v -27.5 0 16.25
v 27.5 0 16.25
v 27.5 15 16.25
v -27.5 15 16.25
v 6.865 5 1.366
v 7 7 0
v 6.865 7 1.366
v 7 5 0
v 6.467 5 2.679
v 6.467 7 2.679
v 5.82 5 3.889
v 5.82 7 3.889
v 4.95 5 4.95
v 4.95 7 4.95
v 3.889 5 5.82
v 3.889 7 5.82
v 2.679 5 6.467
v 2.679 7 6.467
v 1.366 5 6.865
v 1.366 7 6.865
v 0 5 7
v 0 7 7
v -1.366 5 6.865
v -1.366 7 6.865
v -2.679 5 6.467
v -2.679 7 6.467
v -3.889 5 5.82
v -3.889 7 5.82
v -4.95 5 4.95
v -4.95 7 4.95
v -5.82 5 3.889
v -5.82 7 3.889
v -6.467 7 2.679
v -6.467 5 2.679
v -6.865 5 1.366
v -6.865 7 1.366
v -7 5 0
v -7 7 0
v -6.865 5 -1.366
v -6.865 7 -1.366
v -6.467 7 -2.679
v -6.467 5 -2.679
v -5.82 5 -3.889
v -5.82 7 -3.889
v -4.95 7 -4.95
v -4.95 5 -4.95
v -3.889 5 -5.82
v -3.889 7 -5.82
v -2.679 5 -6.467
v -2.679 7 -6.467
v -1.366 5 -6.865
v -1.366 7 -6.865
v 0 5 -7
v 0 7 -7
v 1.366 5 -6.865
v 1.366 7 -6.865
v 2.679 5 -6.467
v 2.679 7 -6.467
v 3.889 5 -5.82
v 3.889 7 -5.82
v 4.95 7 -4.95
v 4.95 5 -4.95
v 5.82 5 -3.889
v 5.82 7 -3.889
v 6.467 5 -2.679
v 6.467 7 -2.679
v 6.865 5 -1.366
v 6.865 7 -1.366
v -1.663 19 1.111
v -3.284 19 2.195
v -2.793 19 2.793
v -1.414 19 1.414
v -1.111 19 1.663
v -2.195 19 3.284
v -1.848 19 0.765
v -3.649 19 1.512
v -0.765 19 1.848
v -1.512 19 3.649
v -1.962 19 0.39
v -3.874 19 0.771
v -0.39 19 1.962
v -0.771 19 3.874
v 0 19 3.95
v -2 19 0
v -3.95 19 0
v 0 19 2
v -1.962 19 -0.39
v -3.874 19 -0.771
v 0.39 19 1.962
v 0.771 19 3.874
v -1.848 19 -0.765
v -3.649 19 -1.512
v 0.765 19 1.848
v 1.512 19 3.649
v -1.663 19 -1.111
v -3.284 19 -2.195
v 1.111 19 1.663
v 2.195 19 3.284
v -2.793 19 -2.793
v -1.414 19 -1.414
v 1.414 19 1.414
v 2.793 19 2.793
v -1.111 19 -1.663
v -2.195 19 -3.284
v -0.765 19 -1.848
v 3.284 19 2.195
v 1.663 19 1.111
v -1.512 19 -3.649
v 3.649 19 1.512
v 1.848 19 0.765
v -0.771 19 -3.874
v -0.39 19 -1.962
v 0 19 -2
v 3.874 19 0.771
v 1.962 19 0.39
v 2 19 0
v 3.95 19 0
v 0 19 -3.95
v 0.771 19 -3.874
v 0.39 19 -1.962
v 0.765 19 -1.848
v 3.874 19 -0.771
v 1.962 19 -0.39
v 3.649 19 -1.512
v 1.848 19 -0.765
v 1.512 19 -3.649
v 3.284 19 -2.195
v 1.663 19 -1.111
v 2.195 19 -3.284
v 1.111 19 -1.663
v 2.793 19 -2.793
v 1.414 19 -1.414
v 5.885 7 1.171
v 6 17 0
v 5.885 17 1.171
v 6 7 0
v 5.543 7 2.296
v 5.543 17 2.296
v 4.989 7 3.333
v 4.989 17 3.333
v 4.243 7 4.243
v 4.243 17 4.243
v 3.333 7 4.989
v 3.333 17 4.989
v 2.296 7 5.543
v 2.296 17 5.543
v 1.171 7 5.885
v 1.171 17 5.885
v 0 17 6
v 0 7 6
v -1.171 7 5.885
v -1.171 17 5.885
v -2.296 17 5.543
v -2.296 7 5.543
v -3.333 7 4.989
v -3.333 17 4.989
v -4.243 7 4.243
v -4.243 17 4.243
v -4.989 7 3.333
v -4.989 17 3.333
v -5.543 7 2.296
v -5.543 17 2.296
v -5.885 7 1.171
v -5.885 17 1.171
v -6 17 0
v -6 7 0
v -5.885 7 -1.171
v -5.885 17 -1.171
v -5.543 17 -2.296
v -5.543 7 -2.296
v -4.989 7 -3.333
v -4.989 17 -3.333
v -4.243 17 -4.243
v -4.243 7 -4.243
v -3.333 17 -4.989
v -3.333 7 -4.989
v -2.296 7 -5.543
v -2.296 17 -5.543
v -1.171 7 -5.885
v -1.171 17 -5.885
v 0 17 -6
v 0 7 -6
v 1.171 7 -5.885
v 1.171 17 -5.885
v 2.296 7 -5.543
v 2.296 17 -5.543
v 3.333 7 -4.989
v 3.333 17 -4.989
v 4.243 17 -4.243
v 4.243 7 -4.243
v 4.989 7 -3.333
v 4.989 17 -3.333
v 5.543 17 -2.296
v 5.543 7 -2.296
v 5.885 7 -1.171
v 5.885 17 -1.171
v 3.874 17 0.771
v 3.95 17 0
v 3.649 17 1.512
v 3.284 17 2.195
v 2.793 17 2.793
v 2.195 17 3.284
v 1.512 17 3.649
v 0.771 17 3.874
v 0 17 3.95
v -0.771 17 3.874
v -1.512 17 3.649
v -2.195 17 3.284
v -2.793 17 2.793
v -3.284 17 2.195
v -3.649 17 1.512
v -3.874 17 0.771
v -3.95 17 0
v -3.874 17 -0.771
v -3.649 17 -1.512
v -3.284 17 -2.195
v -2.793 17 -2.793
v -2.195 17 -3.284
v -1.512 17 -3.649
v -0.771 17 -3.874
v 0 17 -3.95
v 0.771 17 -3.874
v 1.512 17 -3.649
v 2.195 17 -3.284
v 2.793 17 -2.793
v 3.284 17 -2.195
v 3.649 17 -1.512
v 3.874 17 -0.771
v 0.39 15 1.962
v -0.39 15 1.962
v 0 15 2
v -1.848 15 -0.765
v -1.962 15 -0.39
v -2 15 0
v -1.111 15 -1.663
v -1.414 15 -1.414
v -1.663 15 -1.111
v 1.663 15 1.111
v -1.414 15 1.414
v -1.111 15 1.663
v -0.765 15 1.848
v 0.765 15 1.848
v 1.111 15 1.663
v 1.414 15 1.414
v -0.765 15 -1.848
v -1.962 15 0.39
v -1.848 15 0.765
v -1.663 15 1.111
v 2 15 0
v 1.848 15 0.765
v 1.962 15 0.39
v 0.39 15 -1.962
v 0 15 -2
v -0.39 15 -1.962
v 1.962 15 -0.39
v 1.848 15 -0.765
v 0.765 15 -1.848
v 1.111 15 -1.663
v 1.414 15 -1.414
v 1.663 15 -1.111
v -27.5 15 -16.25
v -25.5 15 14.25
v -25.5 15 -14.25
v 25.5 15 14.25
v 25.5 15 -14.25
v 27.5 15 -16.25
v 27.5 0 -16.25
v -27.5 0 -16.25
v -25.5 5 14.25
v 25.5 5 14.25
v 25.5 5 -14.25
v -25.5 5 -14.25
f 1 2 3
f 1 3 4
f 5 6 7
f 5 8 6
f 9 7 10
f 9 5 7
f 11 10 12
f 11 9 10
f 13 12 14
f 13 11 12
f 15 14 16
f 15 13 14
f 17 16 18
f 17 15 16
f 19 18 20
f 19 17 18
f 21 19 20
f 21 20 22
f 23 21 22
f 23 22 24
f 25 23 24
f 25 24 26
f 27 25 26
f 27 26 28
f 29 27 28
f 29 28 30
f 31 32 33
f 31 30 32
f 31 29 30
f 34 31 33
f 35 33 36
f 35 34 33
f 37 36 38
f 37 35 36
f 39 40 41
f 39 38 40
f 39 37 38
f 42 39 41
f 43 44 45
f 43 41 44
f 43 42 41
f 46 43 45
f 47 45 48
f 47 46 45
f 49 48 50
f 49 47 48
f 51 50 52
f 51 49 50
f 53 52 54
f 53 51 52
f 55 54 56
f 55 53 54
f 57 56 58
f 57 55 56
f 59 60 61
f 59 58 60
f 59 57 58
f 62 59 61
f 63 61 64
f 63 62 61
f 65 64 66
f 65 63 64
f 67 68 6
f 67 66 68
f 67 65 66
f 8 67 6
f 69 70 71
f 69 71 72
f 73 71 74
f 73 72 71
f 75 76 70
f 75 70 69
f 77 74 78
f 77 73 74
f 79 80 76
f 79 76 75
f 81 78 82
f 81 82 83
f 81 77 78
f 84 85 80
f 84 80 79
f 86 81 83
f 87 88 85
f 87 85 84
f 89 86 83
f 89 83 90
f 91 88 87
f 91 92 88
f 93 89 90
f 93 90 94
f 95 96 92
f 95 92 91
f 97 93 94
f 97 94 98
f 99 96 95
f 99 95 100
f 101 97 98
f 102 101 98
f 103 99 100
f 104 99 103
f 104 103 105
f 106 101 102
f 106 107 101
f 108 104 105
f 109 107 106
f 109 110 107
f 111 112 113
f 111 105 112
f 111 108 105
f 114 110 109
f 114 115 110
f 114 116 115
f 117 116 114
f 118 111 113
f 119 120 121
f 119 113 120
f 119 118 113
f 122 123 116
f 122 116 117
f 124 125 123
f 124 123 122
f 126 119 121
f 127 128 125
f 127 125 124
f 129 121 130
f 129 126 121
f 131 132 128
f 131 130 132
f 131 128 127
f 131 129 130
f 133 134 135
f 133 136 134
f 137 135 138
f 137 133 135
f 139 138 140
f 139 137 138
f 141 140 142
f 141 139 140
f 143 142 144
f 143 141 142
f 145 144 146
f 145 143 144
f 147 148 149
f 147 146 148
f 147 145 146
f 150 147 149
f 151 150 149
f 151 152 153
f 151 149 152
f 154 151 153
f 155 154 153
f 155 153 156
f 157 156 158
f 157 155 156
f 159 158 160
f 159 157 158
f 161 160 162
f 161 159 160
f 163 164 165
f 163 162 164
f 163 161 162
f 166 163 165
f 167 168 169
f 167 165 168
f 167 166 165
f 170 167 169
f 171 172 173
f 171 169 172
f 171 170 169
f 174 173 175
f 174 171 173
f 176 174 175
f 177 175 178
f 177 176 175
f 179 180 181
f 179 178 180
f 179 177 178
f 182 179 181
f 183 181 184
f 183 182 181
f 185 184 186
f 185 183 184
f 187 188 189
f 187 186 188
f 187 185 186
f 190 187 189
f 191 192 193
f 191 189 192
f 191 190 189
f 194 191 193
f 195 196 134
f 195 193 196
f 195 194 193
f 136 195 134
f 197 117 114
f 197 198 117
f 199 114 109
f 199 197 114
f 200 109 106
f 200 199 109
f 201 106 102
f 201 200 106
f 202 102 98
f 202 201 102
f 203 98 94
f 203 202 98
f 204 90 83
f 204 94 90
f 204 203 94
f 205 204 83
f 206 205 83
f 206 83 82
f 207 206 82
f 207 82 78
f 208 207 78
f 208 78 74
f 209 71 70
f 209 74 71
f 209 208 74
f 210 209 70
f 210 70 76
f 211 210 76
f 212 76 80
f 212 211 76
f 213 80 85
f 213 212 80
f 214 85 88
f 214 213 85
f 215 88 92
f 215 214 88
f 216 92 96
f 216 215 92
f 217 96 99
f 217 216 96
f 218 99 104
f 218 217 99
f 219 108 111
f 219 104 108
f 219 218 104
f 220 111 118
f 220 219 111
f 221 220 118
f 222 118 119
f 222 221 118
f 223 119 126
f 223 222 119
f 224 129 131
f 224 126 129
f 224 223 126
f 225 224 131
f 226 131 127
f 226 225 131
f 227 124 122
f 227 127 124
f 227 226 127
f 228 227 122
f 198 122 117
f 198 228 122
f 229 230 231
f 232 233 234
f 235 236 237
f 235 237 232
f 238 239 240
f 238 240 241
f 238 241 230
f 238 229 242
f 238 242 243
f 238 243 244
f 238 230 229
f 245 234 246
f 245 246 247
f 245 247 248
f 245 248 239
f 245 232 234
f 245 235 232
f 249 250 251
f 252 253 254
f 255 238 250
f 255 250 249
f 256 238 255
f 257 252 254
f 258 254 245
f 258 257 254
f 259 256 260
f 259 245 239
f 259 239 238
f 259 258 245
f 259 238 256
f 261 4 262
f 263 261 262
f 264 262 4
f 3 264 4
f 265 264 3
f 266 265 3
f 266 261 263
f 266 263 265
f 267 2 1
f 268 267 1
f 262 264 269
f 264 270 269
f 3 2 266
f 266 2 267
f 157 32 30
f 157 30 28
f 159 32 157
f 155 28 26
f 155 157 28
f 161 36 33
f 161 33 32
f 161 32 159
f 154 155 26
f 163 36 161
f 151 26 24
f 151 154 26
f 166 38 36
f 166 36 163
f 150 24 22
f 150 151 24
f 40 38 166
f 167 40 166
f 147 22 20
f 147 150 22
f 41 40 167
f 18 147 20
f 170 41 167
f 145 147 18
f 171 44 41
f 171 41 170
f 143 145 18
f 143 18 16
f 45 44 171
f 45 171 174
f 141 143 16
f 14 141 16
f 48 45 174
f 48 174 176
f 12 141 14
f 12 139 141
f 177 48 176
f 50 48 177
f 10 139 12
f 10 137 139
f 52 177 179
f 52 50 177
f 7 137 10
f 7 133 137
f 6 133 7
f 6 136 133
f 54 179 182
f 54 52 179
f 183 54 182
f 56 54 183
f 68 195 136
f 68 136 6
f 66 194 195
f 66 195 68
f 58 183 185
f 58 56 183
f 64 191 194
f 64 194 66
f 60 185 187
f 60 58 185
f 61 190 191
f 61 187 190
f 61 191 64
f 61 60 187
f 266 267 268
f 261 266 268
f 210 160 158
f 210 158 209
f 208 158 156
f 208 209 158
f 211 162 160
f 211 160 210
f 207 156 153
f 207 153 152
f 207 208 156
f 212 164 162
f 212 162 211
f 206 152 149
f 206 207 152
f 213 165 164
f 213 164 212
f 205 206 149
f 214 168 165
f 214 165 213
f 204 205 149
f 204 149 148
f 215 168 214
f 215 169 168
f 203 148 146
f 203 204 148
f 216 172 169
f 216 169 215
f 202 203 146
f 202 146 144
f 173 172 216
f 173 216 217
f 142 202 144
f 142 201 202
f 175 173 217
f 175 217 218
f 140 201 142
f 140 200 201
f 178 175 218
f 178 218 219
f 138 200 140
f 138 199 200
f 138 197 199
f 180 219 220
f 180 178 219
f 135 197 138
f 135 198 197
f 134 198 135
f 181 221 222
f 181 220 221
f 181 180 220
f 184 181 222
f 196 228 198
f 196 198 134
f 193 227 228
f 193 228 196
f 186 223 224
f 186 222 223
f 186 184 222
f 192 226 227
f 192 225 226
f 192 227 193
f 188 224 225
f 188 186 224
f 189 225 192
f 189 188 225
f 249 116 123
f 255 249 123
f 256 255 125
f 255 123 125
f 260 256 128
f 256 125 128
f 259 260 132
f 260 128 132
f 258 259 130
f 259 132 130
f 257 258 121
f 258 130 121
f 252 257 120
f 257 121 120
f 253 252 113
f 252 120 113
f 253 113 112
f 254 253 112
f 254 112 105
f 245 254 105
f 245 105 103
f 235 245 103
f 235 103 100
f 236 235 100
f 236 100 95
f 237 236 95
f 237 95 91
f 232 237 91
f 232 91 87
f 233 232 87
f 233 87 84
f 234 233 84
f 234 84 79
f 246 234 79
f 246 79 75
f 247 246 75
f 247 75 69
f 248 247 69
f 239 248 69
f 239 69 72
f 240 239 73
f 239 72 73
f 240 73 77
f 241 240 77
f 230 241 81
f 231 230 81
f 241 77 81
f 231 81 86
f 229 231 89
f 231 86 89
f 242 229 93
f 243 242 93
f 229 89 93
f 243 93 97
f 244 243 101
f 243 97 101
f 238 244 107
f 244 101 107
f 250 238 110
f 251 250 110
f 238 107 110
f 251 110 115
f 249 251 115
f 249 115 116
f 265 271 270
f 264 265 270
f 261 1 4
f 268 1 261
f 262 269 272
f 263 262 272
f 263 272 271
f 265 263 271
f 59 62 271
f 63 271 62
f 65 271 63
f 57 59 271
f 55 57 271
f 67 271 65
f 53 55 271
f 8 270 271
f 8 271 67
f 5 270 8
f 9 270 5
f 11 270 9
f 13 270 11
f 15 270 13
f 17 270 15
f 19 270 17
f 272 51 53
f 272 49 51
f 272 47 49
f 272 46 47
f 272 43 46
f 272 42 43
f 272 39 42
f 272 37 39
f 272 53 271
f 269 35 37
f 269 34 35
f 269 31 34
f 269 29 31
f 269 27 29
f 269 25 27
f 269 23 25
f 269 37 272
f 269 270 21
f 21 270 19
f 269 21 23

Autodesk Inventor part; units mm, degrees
ref_plane "YZ Plane" through (0, 0, 0) normal (1, 0, 0) x (0, 1, 0)
ref_plane "XZ Plane" through (0, 0, 0) normal (0, 1, 0) x (-1, 0, 0)
ref_plane "XY Plane" through (0, 0, 0) normal (0, 0, 1) x (1, 0, 0)
sketch "Skizze1" plane through (0, 0, 0) normal (0, 1, 0) x (-1, 0, 0)
  line L0 (-27.5, -16.25) -> (27.5, -16.25)
  line L1 (27.5, -16.25) -> (27.5, 16.25)
  line L2 (27.5, 16.25) -> (-27.5, 16.25)
  line L3 (-27.5, 16.25) -> (-27.5, -16.25)
  line L4 (-38.5, 0) -> (38.5, 0) projected
  line L5 (0, -22.75) -> (0, 22.75) projected
  point P0 (0, 0)
  dimension "d0" = 55
  dimension "d1" = 32.5
extrude "Extrusion1" add sketch "Skizze1" along normal blind 5
sketch "Skizze5" plane through (0, 5, 0) normal (0, 1, 0) x (1, 0, 0)
  line L0 (27.5, 16.25) -> (-27.5, 16.25) projected
  line L1 (27.5, -16.25) -> (27.5, 16.25) projected
  line L2 (-27.5, 16.25) -> (27.5, 16.25)
  line L3 (27.5, 16.25) -> (27.5, -16.25)
  line L4 (27.5, -16.25) -> (-27.5, -16.25)
  line L5 (-27.5, -16.25) -> (-27.5, 16.25)
  line L6 (-25.5, 14.25) -> (25.5, 14.25)
  line L7 (25.5, 14.25) -> (25.5, -14.25)
  line L8 (25.5, -14.25) -> (-25.5, -14.25)
  line L9 (-25.5, -14.25) -> (-25.5, 14.25)
  point P0 (0, 0)
  dimension "d14" = 2
extrude "Extrusion5" add sketch "Skizze5" along normal blind 10
sketch "Skizze6" plane through (0, 5, 0) normal (0, 1, 0) x (1, 0, 0)
  circle A0 centre (0, 0) radius 6
  circle A1 centre (0, 0) radius 7
  dimension "d17" = 12
  dimension "d18" = 14
extrude "Extrusion6" add sketch "Skizze6" along normal blind 2
extrude "Extrusion7" add sketch "Skizze6" along normal blind 12 contours A0
sketch "Skizze8" plane through (0, 17, 0) normal (0, 1, 0) x (1, 0, 0)
  circle A0 centre (0, 0) radius 3.95
  dimension "d23" = 7.9
extrude "Extrusion8" add sketch "Skizze8" along normal blind 2
sketch "Skizze9" plane through (0, 19, 0) normal (0, 1, 0) x (1, 0, 0)
  circle A0 centre (0, 0) radius 2
  dimension "d26" = 4
extrude "Extrusion9" cut sketch "Skizze9" against normal blind 4
properties part number "Servoverbindung_Konzept"
